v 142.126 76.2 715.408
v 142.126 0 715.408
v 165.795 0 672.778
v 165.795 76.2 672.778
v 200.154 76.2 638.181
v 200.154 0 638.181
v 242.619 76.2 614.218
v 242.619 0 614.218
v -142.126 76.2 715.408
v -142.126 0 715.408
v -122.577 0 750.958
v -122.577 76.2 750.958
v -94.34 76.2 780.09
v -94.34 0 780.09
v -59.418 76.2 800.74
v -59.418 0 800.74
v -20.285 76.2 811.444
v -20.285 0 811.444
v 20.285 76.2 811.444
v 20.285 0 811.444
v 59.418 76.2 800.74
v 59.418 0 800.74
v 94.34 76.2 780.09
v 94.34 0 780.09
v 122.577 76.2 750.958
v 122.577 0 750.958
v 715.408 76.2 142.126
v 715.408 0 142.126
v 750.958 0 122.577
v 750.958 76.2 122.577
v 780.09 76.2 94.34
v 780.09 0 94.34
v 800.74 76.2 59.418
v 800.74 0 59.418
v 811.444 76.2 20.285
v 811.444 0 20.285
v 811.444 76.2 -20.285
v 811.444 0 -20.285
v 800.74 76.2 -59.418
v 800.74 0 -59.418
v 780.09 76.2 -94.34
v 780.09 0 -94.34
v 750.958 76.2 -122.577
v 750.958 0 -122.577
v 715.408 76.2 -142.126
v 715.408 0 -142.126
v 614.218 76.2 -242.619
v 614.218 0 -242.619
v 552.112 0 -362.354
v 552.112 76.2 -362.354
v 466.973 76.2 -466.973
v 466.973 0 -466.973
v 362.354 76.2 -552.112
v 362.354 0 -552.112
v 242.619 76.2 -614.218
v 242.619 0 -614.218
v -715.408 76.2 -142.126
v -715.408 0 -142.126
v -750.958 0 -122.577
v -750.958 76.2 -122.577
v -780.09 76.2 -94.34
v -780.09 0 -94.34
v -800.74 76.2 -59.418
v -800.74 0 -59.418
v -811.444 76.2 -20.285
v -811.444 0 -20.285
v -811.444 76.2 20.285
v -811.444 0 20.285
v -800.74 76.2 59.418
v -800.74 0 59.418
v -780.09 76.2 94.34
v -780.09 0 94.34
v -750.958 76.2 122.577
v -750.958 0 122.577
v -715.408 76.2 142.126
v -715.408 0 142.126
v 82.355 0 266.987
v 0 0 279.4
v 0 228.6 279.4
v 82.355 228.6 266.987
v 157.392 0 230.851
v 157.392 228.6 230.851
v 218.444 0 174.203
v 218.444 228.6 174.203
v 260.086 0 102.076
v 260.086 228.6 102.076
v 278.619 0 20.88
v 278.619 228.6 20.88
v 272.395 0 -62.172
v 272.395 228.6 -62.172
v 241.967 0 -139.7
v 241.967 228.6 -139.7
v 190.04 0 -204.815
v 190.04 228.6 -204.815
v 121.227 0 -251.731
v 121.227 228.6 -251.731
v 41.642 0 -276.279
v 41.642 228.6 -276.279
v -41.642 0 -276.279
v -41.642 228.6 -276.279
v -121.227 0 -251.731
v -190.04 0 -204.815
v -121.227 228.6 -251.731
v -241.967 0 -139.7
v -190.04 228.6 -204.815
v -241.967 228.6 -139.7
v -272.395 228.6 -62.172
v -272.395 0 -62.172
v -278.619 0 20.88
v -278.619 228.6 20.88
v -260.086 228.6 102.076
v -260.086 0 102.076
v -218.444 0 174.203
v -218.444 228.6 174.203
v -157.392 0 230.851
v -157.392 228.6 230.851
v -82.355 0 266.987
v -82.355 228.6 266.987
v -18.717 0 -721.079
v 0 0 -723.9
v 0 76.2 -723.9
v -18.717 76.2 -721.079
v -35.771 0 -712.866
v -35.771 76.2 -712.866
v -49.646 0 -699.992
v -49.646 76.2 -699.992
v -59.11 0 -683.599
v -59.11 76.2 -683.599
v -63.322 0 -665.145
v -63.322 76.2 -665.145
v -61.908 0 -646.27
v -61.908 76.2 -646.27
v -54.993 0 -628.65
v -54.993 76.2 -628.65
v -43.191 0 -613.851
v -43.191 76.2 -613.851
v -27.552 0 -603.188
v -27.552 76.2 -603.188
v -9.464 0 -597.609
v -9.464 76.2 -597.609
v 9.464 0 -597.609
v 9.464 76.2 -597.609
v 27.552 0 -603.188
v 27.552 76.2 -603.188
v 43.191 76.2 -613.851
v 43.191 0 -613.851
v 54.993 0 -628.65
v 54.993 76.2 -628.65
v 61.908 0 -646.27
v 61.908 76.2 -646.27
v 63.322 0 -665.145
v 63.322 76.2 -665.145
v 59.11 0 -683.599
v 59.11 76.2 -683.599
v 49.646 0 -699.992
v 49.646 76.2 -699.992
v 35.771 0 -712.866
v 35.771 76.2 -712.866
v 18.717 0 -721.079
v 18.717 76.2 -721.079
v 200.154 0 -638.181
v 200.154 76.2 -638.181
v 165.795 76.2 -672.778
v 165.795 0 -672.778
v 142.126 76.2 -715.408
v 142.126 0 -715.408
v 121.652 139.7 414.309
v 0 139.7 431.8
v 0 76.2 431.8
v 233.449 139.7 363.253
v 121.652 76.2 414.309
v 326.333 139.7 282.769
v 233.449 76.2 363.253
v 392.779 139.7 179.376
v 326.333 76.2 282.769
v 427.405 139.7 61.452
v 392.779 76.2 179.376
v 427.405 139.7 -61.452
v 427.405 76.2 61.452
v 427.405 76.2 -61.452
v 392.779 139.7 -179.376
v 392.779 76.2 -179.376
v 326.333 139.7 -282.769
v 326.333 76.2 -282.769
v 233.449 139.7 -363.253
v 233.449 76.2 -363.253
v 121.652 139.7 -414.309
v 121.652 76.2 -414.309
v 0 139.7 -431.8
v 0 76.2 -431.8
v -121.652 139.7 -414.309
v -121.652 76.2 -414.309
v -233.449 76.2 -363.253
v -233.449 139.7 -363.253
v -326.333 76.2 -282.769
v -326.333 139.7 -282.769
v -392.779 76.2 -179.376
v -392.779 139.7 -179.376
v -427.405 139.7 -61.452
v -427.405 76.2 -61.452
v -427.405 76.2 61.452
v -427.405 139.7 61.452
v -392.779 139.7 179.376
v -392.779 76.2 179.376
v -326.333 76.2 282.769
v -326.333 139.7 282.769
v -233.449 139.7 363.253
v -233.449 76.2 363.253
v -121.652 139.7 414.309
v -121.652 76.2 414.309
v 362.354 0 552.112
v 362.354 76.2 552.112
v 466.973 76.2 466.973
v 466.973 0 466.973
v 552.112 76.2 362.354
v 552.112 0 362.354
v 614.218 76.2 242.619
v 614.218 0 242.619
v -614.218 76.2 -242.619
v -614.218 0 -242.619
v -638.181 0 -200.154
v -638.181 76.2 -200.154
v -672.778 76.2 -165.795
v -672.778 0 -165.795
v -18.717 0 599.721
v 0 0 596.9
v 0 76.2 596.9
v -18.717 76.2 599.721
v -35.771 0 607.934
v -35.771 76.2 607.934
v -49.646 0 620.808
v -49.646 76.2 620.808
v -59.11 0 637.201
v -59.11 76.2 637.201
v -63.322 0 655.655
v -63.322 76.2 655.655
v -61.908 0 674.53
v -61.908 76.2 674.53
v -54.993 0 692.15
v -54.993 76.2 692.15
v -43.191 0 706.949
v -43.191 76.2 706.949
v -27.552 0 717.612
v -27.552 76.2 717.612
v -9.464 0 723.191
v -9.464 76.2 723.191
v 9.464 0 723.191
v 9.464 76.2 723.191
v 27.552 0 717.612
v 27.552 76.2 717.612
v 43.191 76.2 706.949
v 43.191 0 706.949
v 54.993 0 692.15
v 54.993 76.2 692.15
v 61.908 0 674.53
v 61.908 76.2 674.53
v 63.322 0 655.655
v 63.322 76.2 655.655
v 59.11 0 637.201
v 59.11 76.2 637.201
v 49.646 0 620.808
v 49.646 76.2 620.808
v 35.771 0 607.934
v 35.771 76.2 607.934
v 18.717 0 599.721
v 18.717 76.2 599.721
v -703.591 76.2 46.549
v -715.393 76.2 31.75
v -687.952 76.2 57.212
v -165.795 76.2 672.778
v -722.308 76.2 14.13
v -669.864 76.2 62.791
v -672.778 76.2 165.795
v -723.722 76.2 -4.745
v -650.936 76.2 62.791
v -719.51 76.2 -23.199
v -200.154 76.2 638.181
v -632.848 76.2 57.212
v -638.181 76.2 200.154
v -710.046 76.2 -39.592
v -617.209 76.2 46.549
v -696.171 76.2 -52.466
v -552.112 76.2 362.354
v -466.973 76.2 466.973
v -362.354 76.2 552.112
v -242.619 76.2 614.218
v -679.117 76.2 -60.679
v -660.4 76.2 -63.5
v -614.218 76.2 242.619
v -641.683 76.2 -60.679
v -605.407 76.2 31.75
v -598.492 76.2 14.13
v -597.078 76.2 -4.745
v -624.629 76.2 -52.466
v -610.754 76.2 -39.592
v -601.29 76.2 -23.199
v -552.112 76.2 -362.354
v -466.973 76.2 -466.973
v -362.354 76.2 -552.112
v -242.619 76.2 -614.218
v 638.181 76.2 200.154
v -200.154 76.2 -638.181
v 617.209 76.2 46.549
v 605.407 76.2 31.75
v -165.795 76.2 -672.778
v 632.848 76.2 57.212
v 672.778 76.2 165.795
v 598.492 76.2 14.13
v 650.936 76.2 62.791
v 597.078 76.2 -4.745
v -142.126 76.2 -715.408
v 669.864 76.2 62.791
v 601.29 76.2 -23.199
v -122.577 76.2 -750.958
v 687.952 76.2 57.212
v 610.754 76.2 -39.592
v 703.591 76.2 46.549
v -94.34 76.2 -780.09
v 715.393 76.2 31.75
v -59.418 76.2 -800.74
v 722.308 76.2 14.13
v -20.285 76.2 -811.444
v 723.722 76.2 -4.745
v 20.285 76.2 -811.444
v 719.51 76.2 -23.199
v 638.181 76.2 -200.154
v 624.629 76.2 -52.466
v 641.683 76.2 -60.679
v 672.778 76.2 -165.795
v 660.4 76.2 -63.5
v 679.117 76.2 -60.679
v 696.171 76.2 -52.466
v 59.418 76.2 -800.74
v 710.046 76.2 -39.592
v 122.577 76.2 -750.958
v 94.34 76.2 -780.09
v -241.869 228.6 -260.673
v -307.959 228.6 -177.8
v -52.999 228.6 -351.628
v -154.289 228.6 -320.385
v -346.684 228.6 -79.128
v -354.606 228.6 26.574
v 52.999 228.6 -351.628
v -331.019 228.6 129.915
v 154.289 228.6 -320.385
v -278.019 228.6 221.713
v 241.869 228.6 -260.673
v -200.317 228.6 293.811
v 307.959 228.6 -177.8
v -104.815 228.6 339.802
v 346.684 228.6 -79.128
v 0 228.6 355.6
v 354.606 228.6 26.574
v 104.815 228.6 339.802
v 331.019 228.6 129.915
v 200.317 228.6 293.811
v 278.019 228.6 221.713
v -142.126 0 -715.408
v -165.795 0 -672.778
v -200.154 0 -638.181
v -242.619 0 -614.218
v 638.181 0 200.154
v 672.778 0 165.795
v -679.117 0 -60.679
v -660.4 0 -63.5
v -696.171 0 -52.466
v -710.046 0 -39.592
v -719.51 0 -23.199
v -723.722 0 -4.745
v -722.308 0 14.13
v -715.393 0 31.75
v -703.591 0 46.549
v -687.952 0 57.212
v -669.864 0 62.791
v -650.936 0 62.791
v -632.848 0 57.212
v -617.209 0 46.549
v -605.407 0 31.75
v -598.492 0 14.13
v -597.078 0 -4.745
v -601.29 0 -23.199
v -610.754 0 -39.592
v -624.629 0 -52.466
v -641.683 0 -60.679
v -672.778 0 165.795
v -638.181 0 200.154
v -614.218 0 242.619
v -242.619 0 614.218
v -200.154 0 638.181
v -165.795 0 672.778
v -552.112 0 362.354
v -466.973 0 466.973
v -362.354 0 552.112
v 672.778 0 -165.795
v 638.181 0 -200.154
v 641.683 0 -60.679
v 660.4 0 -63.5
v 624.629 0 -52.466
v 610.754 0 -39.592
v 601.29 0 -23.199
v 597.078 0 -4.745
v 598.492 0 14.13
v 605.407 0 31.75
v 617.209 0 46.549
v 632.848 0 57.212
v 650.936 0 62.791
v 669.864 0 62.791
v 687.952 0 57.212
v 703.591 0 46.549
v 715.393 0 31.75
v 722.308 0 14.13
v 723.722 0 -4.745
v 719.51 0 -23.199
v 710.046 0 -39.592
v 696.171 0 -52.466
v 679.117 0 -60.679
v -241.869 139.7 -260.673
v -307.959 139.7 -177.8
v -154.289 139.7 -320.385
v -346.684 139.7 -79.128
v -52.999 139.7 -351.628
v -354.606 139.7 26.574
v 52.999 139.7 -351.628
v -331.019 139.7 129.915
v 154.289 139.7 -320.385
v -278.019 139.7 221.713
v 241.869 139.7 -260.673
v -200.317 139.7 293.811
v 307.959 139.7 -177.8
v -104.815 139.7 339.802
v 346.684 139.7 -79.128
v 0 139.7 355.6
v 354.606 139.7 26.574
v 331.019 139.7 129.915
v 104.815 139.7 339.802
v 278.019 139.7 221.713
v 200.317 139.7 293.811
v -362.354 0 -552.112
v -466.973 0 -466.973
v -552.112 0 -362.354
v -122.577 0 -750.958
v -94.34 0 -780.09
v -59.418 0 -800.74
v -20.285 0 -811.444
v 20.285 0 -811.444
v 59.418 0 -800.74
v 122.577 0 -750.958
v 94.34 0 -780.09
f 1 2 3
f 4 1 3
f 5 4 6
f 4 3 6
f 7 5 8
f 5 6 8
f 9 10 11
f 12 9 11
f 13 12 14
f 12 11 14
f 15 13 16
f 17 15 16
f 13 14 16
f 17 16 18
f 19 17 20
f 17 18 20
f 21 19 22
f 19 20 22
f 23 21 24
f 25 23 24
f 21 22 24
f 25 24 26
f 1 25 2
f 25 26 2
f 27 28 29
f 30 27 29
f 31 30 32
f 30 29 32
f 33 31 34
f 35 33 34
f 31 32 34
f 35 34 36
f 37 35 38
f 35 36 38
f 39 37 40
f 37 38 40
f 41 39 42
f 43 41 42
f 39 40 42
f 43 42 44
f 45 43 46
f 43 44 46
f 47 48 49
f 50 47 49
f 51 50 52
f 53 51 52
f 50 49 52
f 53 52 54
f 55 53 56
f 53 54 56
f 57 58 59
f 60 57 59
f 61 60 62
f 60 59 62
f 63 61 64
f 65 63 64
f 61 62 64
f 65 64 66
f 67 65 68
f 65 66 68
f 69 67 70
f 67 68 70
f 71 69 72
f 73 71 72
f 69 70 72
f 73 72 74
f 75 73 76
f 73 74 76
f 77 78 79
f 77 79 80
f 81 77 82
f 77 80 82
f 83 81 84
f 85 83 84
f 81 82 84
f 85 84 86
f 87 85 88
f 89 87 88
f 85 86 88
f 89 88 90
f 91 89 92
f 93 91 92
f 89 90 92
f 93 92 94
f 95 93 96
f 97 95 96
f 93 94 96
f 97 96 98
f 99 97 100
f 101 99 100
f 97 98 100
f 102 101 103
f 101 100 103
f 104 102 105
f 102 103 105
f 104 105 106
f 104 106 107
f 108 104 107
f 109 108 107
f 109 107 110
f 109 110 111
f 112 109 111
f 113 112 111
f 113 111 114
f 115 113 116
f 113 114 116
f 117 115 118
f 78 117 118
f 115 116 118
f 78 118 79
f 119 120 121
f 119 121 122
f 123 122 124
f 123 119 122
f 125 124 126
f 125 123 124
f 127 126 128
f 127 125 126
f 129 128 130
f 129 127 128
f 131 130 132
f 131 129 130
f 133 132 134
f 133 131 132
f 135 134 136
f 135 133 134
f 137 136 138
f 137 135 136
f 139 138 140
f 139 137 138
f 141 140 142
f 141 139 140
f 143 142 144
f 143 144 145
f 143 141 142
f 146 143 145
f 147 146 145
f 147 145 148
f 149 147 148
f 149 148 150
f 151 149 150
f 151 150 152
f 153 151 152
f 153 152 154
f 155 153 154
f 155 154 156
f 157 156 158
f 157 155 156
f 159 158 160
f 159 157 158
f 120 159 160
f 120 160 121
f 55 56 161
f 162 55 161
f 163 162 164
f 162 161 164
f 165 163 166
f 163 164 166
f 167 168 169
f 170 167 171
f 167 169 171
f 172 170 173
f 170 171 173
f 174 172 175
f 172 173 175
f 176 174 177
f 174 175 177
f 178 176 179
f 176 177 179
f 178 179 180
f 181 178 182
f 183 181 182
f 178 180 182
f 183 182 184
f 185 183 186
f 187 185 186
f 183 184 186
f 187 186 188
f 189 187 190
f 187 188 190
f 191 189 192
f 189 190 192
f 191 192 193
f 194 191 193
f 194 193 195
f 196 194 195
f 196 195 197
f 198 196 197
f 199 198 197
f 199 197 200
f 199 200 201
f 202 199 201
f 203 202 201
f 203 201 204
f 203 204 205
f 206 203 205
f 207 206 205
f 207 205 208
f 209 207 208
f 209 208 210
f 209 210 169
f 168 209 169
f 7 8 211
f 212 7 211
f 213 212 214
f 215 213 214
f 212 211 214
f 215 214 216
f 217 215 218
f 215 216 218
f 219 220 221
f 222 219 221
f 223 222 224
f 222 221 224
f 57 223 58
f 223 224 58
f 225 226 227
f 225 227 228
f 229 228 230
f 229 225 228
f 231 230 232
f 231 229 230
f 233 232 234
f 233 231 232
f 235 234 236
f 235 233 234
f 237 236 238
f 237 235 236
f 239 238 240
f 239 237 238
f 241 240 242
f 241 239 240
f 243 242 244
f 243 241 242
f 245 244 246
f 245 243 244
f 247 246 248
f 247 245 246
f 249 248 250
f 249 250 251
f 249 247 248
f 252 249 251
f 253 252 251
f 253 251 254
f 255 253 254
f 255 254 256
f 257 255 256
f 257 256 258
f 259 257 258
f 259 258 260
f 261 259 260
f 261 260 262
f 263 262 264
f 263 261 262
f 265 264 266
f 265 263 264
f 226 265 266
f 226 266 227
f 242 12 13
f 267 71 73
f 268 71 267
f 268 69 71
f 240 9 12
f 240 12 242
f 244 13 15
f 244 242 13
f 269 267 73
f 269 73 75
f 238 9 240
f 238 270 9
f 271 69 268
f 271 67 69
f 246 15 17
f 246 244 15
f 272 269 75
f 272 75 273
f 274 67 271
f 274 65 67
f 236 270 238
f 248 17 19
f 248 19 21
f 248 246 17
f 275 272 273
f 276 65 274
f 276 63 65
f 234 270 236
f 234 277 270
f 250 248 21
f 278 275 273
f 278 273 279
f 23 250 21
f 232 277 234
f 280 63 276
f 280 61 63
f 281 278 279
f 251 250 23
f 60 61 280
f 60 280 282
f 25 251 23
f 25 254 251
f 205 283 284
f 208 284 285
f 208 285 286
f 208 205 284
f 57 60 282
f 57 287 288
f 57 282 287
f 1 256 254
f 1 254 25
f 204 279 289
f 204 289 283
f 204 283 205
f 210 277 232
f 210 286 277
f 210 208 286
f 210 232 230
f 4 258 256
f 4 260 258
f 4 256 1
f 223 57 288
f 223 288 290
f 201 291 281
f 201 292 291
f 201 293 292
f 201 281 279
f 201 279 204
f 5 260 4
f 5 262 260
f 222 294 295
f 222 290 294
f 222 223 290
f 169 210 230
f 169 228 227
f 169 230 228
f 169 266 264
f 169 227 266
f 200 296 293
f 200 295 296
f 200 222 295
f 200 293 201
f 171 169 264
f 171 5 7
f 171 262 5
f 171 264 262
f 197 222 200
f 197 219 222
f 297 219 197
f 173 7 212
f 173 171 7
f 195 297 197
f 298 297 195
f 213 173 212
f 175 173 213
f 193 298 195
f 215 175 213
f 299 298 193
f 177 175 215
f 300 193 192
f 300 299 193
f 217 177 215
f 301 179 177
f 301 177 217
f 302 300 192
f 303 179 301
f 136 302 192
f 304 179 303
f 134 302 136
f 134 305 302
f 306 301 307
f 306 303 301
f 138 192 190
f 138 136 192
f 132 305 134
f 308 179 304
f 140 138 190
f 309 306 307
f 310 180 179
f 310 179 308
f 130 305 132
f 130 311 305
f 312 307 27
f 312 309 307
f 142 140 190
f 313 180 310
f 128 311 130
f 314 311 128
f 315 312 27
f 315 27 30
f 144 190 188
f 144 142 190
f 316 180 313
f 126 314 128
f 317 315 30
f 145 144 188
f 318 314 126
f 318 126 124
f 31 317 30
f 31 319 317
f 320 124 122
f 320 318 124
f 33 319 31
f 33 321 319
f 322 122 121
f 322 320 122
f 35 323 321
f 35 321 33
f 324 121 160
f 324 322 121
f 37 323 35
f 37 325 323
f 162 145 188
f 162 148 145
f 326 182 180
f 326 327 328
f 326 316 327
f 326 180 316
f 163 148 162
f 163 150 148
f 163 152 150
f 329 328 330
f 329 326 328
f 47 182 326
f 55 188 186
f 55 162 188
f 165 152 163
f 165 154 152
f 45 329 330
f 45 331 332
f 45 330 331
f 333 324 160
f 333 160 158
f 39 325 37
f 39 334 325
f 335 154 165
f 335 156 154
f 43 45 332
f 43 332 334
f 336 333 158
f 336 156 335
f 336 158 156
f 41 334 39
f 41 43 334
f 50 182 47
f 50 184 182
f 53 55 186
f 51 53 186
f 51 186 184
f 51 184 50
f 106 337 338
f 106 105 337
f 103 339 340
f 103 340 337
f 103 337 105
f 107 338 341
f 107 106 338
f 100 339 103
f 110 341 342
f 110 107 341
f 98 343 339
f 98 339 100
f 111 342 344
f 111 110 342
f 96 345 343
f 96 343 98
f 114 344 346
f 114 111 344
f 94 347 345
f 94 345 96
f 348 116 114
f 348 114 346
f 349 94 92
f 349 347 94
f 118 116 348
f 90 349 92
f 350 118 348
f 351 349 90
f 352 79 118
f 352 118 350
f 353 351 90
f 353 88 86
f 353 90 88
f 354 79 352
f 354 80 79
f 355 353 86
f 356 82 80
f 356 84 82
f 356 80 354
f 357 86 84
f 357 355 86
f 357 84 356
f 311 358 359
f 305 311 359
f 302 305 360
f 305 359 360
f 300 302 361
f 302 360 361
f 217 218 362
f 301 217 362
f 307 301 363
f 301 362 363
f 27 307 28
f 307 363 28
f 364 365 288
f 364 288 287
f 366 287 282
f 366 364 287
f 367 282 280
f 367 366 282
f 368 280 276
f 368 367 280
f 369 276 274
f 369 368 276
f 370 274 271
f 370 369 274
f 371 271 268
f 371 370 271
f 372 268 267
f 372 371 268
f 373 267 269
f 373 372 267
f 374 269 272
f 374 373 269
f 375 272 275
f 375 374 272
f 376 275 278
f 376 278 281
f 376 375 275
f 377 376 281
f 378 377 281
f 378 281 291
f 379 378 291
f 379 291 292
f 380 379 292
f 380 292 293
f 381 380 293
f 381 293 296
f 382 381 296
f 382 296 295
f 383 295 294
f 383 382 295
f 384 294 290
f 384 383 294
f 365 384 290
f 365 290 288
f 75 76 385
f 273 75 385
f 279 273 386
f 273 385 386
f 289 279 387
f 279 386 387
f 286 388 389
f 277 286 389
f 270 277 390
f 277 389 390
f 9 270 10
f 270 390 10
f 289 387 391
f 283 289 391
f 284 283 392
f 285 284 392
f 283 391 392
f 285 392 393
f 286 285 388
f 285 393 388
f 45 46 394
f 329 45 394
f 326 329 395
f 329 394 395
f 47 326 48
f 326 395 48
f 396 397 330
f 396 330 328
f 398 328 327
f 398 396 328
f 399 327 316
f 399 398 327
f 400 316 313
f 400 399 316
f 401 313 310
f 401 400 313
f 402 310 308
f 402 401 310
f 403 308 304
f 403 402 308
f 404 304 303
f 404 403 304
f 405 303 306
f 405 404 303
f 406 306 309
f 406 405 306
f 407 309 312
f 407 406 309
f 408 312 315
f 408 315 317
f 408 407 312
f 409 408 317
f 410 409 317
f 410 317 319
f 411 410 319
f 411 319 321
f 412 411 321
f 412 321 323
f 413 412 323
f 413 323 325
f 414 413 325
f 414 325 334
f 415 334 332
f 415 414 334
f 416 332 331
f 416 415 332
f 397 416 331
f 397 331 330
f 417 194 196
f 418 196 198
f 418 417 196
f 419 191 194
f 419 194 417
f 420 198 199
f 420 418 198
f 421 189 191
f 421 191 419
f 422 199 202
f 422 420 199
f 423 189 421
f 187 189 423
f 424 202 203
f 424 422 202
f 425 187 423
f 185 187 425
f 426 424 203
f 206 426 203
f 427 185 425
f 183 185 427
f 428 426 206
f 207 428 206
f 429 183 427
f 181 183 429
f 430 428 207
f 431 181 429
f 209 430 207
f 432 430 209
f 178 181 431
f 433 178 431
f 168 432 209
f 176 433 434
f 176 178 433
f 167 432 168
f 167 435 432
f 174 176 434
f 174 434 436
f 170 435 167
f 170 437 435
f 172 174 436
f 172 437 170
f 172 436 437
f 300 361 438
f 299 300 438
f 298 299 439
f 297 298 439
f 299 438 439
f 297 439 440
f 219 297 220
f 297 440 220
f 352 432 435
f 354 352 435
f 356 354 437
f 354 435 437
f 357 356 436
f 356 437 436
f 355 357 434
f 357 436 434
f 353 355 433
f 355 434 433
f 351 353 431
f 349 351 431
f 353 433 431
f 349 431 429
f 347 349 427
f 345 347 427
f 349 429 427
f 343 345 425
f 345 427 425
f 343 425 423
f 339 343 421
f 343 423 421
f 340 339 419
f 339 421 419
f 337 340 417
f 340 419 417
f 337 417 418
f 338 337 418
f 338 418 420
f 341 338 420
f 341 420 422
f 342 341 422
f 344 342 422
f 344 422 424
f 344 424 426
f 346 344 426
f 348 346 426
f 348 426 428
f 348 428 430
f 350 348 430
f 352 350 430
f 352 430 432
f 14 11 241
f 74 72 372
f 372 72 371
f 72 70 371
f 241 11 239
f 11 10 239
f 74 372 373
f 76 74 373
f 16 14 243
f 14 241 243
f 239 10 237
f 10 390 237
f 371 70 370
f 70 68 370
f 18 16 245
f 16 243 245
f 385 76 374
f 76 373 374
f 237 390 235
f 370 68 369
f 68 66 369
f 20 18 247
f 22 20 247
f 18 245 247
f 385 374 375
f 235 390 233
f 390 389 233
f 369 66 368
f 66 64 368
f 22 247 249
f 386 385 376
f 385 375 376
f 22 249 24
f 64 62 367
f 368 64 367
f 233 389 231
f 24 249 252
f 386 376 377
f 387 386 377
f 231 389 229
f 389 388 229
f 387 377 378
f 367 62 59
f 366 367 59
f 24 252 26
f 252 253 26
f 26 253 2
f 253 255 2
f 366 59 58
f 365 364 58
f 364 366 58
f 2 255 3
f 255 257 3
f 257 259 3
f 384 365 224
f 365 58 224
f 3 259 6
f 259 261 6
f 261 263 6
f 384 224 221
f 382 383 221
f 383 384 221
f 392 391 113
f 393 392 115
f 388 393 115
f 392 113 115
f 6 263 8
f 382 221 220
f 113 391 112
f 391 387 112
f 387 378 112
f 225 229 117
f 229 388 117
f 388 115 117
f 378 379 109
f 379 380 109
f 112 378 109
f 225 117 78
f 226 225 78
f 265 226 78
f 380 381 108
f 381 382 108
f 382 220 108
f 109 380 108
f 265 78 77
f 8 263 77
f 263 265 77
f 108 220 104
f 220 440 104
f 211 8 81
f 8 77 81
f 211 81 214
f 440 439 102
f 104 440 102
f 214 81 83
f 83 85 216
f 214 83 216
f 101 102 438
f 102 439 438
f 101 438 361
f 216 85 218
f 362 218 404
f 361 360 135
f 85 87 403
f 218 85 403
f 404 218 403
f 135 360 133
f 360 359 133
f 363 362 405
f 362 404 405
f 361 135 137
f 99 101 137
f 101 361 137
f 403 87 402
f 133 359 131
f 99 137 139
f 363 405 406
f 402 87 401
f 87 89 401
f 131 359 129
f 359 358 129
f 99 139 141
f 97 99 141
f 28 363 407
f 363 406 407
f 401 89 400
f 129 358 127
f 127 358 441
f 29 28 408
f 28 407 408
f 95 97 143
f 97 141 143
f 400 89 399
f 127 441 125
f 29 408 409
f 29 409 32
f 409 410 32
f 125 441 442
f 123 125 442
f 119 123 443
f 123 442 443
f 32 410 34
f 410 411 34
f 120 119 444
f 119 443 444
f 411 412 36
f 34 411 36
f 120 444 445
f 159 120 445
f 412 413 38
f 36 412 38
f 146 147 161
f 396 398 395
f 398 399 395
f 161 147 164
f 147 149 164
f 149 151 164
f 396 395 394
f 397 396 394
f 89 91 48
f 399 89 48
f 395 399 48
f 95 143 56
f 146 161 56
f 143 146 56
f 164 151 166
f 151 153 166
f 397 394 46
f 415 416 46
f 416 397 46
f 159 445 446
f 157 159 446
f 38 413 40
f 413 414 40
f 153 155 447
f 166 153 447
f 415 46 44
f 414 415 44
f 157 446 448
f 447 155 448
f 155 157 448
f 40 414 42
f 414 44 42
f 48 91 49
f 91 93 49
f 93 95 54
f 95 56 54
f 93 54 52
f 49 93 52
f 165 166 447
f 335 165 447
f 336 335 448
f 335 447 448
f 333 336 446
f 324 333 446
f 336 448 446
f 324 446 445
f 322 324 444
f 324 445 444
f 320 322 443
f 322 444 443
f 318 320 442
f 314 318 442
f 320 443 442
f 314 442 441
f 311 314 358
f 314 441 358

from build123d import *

# Parameters (mm, degrees)
SKETCH1_R           = 355.6
SKETCH1_R_2         = 279.4
BOSS_EXTRUDE2_DEPTH = 228.6
SKETCH2_R           = 431.8
BOSS_EXTRUDE3_DEPTH = 139.7
SKETCH3_R           = 63.5
BOSS_EXTRUDE4_DEPTH = 76.2
CUT_EXTRUDE1_REACH  = 1159.931
SKETCH4_R           = 279.4


with BuildPart() as part:
    # Sketch1 → Boss-Extrude2 (new body)
    with BuildSketch(Plane(origin=(0, 0, 0), x_dir=(1, 0, 0), z_dir=(0, 1, 0))):
        with Locations(Location((0, 0, 0), (0, 0, 270))):
            Circle(SKETCH1_R)
        with Locations(Location((0, 0, 0), (0, 0, 270))):
            Circle(SKETCH1_R_2, mode=Mode.SUBTRACT)
    extrude(amount=BOSS_EXTRUDE2_DEPTH)

    # Sketch2 → Boss-Extrude3 (add)
    with BuildSketch(Plane(origin=(0, 0, 0), x_dir=(1, 0, 0), z_dir=(0, 1, 0))):
        with Locations(Location((0, 0, 0), (0, 0, 270))):
            Circle(SKETCH2_R)
    extrude(amount=BOSS_EXTRUDE3_DEPTH)

    # Sketch3 → Boss-Extrude4 (add)
    with BuildSketch(Plane(origin=(0, 0, 0), x_dir=(1, 0, 0), z_dir=(0, 1, 0))):
        with BuildLine():
            ThreePointArc((-142.126171723, -715.408284024), (0, -812.8), (142.126171723, -715.408284024))
            ThreePointArc((142.126171723, -715.408284024), (181.782810221, -654.296173404), (242.619424457, -614.218181818))
            ThreePointArc((242.619424457, -614.218181818), (466.973318296, -466.973318296), (614.218181818, -242.619424457))
            ThreePointArc((614.218181818, -242.619424457), (654.296173404, -181.782810221), (715.408284024, -142.126171723))
            ThreePointArc((715.408284024, -142.126171723), (812.8, 0), (715.408284024, 142.126171723))
            ThreePointArc((715.408284024, 142.126171723), (654.296173404, 181.782810221), (614.218181818, 242.619424457))
            ThreePointArc((614.218181818, 242.619424457), (466.973318296, 466.973318296), (242.619424457, 614.218181818))
            ThreePointArc((242.619424457, 614.218181818), (181.782810221, 654.296173404), (142.126171723, 715.408284024))
            ThreePointArc((142.126171723, 715.408284024), (0, 812.8), (-142.126171723, 715.408284024))
            ThreePointArc((-142.126171723, 715.408284024), (-181.782810221, 654.296173404), (-242.619424457, 614.218181818))
            ThreePointArc((-242.619424457, 614.218181818), (-466.973318296, 466.973318296), (-614.218181818, 242.619424457))
            ThreePointArc((-614.218181818, 242.619424457), (-654.296173404, 181.782810221), (-715.408284024, 142.126171723))
            ThreePointArc((-715.408284024, 142.126171723), (-812.8, 0), (-715.408284024, -142.126171723))
            ThreePointArc((-715.408284024, -142.126171723), (-654.296173404, -181.782810221), (-614.218181818, -242.619424457))
            ThreePointArc((-614.218181818, -242.619424457), (-466.973318296, -466.973318296), (-242.619424457, -614.218181818))
            ThreePointArc((-242.619424457, -614.218181818), (-181.782810221, -654.296173404), (-142.126171723, -715.408284024))
        make_face()
        with Locations(Location((0, 660.4, 0), (0, 0, 90))):
            Circle(SKETCH3_R, mode=Mode.SUBTRACT)
        with Locations(Location((660.4, 0, 0), (0, 0, 90))):
            Circle(SKETCH3_R, mode=Mode.SUBTRACT)
        with Locations(Location((0, -660.4, 0), (0, 0, 90))):
            Circle(SKETCH3_R, mode=Mode.SUBTRACT)
        with Locations(Location((-660.4, 0, 0), (0, 0, 90))):
            Circle(SKETCH3_R, mode=Mode.SUBTRACT)
    extrude(amount=BOSS_EXTRUDE4_DEPTH)

    # Sketch4 → Cut-Extrude1 (cut, up to next)
    with BuildSketch(Plane(origin=(0, 139.7, 0), x_dir=(1, 0, 0), z_dir=(0, 1, 0)), mode=Mode.PRIVATE) as cut_extrude1_sk1:
        with Locations(Location((0, 0, 0), (0, 0, 270))):
            Circle(SKETCH4_R)
    cut_extrude1_tool1 = extrude(cut_extrude1_sk1.sketch, amount=-CUT_EXTRUDE1_REACH, mode=Mode.PRIVATE) & part.part
    add(cut_extrude1_tool1.solids().sort_by_distance((0, 139.7, 0))[0], mode=Mode.SUBTRACT)


solid = part.part
